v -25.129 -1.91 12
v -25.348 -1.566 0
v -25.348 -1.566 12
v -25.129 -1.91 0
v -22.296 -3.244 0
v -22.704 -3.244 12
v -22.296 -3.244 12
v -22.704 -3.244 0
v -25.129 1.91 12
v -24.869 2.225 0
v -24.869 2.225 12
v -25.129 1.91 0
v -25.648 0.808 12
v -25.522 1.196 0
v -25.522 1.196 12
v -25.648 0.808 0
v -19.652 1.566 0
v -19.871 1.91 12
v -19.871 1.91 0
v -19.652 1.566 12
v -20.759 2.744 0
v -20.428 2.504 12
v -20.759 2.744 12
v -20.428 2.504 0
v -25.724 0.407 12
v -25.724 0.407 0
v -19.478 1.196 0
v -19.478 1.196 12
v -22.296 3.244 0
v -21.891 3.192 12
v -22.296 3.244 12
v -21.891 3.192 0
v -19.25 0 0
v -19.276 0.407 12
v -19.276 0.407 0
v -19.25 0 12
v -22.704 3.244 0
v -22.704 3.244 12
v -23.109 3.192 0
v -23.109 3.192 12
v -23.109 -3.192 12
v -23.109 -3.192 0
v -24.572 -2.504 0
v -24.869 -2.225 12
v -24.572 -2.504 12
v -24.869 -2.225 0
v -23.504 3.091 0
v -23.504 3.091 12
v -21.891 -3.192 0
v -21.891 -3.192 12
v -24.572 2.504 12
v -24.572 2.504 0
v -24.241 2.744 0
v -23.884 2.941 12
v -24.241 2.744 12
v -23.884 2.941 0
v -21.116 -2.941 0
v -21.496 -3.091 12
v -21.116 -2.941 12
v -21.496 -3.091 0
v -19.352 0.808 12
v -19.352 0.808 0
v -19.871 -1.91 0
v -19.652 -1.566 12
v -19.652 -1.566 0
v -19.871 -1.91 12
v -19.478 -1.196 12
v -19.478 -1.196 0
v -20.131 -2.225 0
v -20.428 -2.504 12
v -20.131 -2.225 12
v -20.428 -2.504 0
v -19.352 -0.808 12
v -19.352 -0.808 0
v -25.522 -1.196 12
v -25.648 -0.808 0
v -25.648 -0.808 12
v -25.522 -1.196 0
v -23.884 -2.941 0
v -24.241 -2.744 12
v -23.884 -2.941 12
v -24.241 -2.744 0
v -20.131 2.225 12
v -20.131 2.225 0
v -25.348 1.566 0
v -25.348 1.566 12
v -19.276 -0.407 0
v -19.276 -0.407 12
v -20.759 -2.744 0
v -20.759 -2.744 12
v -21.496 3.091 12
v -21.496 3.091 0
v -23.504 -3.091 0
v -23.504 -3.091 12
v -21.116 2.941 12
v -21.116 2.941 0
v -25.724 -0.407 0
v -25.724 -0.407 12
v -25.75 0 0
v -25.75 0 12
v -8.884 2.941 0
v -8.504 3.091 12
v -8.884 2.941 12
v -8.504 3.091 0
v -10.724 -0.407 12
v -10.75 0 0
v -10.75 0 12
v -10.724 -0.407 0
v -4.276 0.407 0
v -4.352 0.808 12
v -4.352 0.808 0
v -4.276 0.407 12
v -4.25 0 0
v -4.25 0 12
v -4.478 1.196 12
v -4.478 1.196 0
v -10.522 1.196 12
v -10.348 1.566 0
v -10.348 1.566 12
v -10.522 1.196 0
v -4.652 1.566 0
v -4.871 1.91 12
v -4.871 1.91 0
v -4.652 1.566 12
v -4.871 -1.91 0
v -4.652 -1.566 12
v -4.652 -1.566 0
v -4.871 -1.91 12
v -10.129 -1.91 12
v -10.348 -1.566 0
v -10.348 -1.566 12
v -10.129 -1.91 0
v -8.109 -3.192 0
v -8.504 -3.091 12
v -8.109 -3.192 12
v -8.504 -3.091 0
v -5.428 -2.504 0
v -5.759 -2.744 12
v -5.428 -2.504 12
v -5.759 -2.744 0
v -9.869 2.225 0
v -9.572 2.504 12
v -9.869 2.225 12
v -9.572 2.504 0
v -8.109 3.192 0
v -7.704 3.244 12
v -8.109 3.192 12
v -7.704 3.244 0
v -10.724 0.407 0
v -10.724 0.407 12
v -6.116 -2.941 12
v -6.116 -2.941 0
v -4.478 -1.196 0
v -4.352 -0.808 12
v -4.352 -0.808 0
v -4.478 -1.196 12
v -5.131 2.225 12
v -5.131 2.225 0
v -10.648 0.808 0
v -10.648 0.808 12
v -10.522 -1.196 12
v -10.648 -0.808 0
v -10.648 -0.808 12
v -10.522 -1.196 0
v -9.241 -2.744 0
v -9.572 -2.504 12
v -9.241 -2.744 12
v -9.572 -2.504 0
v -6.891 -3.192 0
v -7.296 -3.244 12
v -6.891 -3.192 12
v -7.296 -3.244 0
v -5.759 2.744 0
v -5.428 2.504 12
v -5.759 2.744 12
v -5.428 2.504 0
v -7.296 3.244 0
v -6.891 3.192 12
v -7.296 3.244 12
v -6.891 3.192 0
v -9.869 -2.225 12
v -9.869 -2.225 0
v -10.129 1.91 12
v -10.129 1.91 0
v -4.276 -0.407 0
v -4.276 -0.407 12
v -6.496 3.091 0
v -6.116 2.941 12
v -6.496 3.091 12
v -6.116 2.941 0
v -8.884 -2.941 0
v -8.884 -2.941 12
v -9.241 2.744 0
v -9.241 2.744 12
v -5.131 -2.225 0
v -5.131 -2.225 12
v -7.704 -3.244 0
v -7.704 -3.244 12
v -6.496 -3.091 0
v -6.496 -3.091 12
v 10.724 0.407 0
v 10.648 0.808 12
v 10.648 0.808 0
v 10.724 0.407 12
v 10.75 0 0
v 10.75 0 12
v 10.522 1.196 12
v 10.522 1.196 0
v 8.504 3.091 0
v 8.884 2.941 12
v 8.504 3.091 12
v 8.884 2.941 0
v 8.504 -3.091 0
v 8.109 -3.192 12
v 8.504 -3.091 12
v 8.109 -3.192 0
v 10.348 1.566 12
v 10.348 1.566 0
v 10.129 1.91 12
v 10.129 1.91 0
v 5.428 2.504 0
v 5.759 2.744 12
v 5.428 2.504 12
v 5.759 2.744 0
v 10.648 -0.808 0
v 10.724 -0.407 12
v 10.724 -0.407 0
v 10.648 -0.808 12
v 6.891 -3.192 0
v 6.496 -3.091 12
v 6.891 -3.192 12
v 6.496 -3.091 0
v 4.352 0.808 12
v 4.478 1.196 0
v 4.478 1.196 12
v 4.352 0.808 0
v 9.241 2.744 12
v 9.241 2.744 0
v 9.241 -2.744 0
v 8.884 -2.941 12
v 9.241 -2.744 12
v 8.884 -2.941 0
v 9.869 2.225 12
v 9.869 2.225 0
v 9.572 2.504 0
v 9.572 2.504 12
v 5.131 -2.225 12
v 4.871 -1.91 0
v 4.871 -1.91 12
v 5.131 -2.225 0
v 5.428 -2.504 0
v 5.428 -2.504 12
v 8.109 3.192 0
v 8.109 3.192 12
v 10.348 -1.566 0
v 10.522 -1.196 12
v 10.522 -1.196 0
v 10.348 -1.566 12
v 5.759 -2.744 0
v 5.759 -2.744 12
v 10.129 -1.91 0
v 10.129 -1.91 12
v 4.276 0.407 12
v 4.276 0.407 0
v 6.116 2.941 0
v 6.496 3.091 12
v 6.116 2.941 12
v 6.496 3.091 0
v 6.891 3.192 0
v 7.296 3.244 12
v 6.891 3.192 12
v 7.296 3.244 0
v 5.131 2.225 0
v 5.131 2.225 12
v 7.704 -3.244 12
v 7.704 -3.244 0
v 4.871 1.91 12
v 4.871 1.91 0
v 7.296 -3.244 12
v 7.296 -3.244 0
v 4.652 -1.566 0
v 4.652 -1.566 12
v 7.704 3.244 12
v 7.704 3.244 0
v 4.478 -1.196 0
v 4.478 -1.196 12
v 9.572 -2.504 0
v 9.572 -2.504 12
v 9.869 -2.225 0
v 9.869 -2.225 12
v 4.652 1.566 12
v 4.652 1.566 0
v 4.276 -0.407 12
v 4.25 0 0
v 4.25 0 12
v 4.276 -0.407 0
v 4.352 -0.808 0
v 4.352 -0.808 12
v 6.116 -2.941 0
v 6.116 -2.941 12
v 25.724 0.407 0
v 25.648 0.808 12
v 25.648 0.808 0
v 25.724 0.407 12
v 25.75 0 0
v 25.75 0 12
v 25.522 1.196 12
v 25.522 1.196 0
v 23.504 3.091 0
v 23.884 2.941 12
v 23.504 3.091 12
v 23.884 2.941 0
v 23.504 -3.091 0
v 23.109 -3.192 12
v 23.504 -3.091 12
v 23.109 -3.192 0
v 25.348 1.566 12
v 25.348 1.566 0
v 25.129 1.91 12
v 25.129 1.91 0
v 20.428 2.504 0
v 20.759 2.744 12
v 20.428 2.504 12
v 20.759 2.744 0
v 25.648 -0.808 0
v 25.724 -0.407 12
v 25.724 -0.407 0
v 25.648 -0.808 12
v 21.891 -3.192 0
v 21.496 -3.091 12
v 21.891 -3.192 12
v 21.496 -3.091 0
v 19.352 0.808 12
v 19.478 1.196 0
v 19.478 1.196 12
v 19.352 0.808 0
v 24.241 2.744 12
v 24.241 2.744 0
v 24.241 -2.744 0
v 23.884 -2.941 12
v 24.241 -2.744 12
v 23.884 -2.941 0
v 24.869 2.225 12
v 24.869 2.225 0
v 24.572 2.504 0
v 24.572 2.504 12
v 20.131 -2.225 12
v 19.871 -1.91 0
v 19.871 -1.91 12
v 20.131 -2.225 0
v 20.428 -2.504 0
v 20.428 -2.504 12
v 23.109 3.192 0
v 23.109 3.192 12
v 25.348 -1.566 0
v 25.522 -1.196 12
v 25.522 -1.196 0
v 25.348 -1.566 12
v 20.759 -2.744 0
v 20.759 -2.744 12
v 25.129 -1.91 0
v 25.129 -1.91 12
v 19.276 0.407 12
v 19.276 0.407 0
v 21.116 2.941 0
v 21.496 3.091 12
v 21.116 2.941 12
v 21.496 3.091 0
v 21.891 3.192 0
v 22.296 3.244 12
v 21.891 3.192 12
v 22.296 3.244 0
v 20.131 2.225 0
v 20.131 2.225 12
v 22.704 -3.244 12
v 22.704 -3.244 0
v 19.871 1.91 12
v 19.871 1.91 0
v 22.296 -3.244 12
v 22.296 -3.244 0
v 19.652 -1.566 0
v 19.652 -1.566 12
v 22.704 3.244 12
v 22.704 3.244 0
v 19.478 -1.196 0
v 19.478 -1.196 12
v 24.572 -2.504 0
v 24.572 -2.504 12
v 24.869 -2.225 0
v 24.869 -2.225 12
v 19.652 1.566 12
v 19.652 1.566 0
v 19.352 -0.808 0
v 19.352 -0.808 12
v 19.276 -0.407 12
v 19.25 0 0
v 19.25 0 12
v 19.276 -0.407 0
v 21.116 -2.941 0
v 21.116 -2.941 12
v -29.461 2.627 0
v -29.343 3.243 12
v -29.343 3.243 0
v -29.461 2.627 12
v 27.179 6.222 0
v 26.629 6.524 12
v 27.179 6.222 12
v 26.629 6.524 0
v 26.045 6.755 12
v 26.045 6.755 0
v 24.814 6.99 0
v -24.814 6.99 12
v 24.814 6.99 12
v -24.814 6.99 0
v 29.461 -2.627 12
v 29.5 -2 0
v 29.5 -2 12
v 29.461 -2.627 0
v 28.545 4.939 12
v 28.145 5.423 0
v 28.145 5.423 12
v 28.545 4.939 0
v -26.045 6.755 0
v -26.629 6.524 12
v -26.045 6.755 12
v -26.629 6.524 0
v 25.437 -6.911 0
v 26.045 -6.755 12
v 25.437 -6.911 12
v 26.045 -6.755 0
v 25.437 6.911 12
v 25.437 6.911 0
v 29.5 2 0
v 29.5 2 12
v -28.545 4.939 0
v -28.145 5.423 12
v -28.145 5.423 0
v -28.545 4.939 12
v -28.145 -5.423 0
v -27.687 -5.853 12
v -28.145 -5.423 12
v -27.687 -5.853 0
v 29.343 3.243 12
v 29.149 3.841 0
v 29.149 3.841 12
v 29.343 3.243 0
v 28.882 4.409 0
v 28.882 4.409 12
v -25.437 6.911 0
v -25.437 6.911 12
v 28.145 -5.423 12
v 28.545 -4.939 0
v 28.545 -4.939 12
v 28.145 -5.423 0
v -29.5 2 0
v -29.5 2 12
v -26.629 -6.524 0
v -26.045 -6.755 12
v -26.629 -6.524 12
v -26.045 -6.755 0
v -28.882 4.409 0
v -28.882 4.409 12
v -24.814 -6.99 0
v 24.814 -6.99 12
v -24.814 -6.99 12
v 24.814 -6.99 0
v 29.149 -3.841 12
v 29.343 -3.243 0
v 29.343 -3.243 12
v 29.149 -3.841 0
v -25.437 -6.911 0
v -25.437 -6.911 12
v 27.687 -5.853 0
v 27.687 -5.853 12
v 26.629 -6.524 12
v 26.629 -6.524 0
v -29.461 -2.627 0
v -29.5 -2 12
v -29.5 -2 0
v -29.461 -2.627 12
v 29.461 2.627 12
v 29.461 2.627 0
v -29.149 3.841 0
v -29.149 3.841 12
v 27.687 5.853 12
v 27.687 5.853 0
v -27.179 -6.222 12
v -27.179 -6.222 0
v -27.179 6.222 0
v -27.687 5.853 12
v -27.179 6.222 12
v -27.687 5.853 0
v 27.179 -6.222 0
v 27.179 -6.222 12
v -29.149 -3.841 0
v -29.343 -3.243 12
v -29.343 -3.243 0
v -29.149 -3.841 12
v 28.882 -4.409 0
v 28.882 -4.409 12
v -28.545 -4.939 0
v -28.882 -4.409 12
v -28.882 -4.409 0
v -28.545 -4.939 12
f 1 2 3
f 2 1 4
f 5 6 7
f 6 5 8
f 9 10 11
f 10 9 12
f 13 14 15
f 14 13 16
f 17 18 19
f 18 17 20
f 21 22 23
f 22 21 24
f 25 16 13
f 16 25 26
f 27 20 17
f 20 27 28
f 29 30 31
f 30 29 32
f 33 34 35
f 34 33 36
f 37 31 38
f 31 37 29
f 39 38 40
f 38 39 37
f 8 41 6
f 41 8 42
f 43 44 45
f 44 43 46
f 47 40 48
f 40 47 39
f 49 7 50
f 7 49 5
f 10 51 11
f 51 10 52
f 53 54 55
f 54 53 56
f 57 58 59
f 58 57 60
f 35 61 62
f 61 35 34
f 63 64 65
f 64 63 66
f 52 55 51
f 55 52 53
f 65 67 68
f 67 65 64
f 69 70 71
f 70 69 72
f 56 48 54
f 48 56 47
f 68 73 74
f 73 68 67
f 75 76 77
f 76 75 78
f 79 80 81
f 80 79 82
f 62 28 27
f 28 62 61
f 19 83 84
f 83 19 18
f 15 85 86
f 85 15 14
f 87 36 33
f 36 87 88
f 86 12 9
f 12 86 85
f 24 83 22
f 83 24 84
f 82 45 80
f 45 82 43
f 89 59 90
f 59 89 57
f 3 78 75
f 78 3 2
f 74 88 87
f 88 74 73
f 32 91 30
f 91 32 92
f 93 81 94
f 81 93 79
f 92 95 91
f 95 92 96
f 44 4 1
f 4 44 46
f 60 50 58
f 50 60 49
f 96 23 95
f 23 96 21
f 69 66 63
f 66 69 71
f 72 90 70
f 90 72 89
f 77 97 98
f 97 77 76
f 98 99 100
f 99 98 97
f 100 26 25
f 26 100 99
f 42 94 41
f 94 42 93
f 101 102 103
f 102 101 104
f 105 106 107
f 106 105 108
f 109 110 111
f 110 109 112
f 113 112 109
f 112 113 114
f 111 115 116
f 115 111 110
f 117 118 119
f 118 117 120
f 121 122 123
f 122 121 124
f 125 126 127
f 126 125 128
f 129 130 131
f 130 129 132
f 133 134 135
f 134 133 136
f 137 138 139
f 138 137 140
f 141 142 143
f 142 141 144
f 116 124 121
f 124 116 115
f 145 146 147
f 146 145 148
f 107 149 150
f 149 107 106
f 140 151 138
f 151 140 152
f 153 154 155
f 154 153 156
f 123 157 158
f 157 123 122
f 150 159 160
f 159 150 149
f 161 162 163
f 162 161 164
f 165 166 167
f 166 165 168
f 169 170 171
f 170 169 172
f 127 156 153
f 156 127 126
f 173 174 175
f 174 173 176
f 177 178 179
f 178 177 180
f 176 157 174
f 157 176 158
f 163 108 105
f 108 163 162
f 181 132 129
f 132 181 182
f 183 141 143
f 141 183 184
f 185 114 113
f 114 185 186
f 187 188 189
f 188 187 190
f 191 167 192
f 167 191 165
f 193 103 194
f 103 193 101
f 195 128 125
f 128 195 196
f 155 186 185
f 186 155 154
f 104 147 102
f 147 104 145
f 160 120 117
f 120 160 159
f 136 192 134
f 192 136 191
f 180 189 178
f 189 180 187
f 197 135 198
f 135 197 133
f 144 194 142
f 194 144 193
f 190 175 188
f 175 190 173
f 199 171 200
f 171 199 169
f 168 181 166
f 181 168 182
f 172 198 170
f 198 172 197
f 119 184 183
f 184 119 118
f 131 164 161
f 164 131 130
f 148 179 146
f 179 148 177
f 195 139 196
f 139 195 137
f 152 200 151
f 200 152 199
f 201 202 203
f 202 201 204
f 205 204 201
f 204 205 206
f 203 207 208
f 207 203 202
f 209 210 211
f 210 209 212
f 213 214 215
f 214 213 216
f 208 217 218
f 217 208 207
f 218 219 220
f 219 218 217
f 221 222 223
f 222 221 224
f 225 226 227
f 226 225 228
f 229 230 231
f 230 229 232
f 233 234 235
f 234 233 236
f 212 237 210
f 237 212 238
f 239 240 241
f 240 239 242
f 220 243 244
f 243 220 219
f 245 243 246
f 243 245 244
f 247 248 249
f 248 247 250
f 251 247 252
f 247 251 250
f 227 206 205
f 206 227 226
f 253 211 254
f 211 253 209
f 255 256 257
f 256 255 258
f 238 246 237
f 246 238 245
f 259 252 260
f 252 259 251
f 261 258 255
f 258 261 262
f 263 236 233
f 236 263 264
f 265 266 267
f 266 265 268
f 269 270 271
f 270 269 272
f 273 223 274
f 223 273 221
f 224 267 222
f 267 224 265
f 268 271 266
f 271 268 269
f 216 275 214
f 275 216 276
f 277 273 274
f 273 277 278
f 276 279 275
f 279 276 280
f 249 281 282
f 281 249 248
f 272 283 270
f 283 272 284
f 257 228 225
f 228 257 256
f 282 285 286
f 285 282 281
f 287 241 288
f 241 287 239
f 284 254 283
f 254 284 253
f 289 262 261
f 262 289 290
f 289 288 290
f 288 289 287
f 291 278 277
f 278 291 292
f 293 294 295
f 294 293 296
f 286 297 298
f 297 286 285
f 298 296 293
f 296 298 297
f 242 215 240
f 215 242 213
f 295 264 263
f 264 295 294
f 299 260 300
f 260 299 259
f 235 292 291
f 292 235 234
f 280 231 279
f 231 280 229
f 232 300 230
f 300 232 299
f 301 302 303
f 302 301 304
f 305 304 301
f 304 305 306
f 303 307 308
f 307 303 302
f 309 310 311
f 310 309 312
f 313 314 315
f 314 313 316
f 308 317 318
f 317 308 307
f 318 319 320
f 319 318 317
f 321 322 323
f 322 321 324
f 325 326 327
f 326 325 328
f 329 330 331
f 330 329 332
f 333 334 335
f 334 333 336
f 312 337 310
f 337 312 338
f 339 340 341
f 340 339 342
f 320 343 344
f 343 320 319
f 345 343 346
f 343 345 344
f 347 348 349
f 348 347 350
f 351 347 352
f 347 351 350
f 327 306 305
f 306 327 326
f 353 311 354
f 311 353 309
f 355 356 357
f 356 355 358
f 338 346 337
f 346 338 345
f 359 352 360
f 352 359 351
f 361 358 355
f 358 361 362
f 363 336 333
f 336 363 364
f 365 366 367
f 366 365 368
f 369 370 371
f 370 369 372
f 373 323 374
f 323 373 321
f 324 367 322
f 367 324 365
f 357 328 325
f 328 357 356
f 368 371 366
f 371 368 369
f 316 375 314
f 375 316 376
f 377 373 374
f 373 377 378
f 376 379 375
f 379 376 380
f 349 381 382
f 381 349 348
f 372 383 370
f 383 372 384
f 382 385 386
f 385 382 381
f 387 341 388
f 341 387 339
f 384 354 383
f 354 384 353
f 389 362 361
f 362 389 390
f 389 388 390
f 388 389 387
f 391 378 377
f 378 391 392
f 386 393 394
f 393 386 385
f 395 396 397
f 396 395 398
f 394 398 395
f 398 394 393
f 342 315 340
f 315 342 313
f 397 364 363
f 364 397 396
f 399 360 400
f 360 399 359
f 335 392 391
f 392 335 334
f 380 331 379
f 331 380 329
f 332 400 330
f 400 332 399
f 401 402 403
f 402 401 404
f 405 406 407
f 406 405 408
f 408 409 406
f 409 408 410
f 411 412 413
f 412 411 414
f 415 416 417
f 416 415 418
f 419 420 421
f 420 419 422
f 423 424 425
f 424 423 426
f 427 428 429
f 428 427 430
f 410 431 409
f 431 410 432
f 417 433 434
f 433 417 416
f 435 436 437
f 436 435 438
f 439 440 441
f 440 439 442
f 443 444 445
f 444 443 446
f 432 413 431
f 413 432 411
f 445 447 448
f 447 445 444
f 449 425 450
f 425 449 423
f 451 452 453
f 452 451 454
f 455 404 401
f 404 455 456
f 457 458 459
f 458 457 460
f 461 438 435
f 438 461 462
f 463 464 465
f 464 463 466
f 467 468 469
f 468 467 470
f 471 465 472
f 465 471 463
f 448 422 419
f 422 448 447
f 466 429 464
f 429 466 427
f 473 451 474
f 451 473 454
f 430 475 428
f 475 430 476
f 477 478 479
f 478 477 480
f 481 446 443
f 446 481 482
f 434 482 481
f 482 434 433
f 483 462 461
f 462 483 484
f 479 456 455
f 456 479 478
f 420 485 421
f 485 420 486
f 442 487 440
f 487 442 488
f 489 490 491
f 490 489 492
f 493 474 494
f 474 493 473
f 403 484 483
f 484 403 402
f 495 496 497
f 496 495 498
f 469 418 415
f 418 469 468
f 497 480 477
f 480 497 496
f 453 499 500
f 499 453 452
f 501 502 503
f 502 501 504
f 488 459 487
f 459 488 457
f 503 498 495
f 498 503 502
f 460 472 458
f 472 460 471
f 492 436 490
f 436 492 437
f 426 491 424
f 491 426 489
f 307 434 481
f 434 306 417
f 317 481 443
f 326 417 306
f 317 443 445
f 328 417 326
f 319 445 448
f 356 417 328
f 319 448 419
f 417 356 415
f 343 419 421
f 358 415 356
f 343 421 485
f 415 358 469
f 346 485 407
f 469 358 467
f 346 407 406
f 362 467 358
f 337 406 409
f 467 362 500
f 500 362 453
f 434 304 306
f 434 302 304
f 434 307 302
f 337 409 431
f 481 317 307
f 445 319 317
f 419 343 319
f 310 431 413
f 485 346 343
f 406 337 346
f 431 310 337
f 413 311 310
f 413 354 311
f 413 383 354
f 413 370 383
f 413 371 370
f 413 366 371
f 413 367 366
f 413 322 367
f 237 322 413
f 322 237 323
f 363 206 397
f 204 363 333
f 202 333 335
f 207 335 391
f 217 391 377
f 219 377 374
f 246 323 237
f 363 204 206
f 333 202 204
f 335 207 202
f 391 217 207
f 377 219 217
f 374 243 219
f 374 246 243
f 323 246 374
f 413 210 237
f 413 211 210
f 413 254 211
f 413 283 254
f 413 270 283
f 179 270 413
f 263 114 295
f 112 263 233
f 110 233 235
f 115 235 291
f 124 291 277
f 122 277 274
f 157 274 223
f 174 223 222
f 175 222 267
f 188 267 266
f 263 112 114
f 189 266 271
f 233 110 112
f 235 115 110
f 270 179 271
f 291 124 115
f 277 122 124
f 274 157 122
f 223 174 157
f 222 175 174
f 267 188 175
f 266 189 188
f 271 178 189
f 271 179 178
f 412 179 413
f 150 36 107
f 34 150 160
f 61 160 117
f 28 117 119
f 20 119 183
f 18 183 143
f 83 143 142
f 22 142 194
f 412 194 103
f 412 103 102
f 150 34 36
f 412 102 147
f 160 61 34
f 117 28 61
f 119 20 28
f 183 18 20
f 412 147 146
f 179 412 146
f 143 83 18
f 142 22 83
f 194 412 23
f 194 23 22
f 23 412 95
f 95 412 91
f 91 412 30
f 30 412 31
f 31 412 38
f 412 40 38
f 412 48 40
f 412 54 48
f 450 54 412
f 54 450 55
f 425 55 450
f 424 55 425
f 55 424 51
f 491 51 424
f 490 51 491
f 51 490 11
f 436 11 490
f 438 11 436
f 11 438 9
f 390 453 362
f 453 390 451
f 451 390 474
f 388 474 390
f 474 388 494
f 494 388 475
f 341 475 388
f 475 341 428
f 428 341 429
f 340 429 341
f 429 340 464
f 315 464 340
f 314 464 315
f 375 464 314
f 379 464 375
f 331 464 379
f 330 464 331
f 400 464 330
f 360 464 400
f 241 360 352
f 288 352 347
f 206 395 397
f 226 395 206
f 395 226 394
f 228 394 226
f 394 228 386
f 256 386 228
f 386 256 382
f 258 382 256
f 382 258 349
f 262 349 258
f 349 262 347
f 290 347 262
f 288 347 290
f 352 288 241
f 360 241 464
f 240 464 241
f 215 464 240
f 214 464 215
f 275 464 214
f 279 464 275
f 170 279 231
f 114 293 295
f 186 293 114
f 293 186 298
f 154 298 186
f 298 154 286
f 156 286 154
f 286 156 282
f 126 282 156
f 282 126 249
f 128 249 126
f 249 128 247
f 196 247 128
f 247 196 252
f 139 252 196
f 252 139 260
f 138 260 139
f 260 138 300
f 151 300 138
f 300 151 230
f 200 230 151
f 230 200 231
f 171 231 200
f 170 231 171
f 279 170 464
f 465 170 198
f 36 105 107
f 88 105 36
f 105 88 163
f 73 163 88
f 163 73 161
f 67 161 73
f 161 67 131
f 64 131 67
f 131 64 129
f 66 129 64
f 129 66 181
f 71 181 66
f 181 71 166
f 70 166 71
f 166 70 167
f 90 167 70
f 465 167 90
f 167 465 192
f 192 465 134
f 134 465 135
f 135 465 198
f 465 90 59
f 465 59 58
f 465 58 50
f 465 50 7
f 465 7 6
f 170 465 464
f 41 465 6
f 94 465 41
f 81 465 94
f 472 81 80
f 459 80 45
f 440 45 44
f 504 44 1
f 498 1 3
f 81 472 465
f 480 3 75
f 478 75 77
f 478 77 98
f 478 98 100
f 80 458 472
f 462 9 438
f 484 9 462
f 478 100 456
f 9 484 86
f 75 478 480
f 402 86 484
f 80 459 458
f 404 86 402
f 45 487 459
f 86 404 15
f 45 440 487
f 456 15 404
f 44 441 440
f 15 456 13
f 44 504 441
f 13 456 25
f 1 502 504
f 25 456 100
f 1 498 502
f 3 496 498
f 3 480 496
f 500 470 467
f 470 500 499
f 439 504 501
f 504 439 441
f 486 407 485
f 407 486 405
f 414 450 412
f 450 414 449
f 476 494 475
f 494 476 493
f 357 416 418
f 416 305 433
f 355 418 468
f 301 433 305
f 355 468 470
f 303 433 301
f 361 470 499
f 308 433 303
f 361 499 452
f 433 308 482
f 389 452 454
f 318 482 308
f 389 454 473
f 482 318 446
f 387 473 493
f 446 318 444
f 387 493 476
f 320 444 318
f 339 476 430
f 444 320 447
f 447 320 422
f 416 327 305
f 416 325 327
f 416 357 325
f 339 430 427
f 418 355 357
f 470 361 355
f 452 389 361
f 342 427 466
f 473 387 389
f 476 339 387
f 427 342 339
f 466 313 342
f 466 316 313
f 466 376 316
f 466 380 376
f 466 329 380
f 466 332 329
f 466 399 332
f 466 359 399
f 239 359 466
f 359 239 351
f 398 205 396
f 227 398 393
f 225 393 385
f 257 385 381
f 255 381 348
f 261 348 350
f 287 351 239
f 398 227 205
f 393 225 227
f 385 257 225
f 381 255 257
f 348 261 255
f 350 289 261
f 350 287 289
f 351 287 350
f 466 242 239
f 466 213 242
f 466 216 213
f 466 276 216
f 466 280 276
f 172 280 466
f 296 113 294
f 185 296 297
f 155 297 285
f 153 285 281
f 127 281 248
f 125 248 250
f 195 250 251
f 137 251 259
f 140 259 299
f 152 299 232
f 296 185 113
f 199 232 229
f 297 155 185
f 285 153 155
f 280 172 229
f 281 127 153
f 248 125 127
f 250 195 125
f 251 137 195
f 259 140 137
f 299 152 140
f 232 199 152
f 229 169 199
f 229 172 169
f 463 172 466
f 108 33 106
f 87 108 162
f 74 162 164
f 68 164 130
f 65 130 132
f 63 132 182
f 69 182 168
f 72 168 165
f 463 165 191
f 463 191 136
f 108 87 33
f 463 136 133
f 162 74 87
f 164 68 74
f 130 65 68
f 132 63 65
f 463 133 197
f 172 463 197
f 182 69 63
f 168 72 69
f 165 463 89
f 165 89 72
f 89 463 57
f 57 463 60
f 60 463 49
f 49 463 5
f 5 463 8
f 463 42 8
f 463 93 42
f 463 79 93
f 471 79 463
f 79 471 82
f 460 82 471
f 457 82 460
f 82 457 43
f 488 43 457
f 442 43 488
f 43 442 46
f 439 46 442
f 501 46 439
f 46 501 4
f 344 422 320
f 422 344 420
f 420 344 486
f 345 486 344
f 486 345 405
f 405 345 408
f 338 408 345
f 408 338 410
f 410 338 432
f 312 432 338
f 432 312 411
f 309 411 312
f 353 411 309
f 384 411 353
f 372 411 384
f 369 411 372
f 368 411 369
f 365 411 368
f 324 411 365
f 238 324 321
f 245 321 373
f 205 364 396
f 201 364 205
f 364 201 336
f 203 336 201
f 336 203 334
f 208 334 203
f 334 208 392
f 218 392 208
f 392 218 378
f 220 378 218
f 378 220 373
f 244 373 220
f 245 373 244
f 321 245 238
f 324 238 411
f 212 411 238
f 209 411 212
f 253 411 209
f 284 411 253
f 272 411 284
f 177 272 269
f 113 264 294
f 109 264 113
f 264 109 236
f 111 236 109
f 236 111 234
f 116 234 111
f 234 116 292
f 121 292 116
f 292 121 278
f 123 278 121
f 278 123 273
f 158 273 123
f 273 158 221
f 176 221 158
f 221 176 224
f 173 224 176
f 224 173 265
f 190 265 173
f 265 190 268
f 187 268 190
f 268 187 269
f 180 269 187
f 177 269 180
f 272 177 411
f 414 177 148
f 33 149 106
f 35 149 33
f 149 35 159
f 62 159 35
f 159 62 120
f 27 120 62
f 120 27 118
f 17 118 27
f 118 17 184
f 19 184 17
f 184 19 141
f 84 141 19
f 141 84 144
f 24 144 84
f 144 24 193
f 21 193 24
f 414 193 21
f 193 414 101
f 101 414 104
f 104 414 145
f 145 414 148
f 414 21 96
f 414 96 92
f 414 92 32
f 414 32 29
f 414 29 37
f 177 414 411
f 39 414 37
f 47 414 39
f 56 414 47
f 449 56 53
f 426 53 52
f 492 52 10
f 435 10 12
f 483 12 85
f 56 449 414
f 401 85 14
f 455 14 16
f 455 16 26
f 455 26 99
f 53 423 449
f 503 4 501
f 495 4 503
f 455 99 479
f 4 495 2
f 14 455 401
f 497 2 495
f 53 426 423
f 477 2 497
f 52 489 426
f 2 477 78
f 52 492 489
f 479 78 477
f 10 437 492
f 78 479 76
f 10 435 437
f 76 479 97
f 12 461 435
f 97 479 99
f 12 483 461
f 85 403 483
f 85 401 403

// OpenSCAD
$fn = 50;


difference() {
	union() {
		hull() {
			translate(v = [-24.5000000000, 2.0000000000, 0]) {
				cylinder(h = 12, r = 5);
			}
			translate(v = [24.5000000000, 2.0000000000, 0]) {
				cylinder(h = 12, r = 5);
			}
			translate(v = [-24.5000000000, -2.0000000000, 0]) {
				cylinder(h = 12, r = 5);
			}
			translate(v = [24.5000000000, -2.0000000000, 0]) {
				cylinder(h = 12, r = 5);
			}
		}
	}
	union() {
		translate(v = [-22.5000000000, 0.0000000000, 0]) {
			translate(v = [0, 0, -100]) {
				cylinder(h = 200, r = 3.2500000000);
			}
		}
		translate(v = [-7.5000000000, 0.0000000000, 0]) {
			translate(v = [0, 0, -100]) {
				cylinder(h = 200, r = 3.2500000000);
			}
		}
		translate(v = [7.5000000000, 0.0000000000, 0]) {
			translate(v = [0, 0, -100]) {
				cylinder(h = 200, r = 3.2500000000);
			}
		}
		translate(v = [22.5000000000, 0.0000000000, 0]) {
			translate(v = [0, 0, -100]) {
				cylinder(h = 200, r = 3.2500000000);
			}
		}
	}
}
